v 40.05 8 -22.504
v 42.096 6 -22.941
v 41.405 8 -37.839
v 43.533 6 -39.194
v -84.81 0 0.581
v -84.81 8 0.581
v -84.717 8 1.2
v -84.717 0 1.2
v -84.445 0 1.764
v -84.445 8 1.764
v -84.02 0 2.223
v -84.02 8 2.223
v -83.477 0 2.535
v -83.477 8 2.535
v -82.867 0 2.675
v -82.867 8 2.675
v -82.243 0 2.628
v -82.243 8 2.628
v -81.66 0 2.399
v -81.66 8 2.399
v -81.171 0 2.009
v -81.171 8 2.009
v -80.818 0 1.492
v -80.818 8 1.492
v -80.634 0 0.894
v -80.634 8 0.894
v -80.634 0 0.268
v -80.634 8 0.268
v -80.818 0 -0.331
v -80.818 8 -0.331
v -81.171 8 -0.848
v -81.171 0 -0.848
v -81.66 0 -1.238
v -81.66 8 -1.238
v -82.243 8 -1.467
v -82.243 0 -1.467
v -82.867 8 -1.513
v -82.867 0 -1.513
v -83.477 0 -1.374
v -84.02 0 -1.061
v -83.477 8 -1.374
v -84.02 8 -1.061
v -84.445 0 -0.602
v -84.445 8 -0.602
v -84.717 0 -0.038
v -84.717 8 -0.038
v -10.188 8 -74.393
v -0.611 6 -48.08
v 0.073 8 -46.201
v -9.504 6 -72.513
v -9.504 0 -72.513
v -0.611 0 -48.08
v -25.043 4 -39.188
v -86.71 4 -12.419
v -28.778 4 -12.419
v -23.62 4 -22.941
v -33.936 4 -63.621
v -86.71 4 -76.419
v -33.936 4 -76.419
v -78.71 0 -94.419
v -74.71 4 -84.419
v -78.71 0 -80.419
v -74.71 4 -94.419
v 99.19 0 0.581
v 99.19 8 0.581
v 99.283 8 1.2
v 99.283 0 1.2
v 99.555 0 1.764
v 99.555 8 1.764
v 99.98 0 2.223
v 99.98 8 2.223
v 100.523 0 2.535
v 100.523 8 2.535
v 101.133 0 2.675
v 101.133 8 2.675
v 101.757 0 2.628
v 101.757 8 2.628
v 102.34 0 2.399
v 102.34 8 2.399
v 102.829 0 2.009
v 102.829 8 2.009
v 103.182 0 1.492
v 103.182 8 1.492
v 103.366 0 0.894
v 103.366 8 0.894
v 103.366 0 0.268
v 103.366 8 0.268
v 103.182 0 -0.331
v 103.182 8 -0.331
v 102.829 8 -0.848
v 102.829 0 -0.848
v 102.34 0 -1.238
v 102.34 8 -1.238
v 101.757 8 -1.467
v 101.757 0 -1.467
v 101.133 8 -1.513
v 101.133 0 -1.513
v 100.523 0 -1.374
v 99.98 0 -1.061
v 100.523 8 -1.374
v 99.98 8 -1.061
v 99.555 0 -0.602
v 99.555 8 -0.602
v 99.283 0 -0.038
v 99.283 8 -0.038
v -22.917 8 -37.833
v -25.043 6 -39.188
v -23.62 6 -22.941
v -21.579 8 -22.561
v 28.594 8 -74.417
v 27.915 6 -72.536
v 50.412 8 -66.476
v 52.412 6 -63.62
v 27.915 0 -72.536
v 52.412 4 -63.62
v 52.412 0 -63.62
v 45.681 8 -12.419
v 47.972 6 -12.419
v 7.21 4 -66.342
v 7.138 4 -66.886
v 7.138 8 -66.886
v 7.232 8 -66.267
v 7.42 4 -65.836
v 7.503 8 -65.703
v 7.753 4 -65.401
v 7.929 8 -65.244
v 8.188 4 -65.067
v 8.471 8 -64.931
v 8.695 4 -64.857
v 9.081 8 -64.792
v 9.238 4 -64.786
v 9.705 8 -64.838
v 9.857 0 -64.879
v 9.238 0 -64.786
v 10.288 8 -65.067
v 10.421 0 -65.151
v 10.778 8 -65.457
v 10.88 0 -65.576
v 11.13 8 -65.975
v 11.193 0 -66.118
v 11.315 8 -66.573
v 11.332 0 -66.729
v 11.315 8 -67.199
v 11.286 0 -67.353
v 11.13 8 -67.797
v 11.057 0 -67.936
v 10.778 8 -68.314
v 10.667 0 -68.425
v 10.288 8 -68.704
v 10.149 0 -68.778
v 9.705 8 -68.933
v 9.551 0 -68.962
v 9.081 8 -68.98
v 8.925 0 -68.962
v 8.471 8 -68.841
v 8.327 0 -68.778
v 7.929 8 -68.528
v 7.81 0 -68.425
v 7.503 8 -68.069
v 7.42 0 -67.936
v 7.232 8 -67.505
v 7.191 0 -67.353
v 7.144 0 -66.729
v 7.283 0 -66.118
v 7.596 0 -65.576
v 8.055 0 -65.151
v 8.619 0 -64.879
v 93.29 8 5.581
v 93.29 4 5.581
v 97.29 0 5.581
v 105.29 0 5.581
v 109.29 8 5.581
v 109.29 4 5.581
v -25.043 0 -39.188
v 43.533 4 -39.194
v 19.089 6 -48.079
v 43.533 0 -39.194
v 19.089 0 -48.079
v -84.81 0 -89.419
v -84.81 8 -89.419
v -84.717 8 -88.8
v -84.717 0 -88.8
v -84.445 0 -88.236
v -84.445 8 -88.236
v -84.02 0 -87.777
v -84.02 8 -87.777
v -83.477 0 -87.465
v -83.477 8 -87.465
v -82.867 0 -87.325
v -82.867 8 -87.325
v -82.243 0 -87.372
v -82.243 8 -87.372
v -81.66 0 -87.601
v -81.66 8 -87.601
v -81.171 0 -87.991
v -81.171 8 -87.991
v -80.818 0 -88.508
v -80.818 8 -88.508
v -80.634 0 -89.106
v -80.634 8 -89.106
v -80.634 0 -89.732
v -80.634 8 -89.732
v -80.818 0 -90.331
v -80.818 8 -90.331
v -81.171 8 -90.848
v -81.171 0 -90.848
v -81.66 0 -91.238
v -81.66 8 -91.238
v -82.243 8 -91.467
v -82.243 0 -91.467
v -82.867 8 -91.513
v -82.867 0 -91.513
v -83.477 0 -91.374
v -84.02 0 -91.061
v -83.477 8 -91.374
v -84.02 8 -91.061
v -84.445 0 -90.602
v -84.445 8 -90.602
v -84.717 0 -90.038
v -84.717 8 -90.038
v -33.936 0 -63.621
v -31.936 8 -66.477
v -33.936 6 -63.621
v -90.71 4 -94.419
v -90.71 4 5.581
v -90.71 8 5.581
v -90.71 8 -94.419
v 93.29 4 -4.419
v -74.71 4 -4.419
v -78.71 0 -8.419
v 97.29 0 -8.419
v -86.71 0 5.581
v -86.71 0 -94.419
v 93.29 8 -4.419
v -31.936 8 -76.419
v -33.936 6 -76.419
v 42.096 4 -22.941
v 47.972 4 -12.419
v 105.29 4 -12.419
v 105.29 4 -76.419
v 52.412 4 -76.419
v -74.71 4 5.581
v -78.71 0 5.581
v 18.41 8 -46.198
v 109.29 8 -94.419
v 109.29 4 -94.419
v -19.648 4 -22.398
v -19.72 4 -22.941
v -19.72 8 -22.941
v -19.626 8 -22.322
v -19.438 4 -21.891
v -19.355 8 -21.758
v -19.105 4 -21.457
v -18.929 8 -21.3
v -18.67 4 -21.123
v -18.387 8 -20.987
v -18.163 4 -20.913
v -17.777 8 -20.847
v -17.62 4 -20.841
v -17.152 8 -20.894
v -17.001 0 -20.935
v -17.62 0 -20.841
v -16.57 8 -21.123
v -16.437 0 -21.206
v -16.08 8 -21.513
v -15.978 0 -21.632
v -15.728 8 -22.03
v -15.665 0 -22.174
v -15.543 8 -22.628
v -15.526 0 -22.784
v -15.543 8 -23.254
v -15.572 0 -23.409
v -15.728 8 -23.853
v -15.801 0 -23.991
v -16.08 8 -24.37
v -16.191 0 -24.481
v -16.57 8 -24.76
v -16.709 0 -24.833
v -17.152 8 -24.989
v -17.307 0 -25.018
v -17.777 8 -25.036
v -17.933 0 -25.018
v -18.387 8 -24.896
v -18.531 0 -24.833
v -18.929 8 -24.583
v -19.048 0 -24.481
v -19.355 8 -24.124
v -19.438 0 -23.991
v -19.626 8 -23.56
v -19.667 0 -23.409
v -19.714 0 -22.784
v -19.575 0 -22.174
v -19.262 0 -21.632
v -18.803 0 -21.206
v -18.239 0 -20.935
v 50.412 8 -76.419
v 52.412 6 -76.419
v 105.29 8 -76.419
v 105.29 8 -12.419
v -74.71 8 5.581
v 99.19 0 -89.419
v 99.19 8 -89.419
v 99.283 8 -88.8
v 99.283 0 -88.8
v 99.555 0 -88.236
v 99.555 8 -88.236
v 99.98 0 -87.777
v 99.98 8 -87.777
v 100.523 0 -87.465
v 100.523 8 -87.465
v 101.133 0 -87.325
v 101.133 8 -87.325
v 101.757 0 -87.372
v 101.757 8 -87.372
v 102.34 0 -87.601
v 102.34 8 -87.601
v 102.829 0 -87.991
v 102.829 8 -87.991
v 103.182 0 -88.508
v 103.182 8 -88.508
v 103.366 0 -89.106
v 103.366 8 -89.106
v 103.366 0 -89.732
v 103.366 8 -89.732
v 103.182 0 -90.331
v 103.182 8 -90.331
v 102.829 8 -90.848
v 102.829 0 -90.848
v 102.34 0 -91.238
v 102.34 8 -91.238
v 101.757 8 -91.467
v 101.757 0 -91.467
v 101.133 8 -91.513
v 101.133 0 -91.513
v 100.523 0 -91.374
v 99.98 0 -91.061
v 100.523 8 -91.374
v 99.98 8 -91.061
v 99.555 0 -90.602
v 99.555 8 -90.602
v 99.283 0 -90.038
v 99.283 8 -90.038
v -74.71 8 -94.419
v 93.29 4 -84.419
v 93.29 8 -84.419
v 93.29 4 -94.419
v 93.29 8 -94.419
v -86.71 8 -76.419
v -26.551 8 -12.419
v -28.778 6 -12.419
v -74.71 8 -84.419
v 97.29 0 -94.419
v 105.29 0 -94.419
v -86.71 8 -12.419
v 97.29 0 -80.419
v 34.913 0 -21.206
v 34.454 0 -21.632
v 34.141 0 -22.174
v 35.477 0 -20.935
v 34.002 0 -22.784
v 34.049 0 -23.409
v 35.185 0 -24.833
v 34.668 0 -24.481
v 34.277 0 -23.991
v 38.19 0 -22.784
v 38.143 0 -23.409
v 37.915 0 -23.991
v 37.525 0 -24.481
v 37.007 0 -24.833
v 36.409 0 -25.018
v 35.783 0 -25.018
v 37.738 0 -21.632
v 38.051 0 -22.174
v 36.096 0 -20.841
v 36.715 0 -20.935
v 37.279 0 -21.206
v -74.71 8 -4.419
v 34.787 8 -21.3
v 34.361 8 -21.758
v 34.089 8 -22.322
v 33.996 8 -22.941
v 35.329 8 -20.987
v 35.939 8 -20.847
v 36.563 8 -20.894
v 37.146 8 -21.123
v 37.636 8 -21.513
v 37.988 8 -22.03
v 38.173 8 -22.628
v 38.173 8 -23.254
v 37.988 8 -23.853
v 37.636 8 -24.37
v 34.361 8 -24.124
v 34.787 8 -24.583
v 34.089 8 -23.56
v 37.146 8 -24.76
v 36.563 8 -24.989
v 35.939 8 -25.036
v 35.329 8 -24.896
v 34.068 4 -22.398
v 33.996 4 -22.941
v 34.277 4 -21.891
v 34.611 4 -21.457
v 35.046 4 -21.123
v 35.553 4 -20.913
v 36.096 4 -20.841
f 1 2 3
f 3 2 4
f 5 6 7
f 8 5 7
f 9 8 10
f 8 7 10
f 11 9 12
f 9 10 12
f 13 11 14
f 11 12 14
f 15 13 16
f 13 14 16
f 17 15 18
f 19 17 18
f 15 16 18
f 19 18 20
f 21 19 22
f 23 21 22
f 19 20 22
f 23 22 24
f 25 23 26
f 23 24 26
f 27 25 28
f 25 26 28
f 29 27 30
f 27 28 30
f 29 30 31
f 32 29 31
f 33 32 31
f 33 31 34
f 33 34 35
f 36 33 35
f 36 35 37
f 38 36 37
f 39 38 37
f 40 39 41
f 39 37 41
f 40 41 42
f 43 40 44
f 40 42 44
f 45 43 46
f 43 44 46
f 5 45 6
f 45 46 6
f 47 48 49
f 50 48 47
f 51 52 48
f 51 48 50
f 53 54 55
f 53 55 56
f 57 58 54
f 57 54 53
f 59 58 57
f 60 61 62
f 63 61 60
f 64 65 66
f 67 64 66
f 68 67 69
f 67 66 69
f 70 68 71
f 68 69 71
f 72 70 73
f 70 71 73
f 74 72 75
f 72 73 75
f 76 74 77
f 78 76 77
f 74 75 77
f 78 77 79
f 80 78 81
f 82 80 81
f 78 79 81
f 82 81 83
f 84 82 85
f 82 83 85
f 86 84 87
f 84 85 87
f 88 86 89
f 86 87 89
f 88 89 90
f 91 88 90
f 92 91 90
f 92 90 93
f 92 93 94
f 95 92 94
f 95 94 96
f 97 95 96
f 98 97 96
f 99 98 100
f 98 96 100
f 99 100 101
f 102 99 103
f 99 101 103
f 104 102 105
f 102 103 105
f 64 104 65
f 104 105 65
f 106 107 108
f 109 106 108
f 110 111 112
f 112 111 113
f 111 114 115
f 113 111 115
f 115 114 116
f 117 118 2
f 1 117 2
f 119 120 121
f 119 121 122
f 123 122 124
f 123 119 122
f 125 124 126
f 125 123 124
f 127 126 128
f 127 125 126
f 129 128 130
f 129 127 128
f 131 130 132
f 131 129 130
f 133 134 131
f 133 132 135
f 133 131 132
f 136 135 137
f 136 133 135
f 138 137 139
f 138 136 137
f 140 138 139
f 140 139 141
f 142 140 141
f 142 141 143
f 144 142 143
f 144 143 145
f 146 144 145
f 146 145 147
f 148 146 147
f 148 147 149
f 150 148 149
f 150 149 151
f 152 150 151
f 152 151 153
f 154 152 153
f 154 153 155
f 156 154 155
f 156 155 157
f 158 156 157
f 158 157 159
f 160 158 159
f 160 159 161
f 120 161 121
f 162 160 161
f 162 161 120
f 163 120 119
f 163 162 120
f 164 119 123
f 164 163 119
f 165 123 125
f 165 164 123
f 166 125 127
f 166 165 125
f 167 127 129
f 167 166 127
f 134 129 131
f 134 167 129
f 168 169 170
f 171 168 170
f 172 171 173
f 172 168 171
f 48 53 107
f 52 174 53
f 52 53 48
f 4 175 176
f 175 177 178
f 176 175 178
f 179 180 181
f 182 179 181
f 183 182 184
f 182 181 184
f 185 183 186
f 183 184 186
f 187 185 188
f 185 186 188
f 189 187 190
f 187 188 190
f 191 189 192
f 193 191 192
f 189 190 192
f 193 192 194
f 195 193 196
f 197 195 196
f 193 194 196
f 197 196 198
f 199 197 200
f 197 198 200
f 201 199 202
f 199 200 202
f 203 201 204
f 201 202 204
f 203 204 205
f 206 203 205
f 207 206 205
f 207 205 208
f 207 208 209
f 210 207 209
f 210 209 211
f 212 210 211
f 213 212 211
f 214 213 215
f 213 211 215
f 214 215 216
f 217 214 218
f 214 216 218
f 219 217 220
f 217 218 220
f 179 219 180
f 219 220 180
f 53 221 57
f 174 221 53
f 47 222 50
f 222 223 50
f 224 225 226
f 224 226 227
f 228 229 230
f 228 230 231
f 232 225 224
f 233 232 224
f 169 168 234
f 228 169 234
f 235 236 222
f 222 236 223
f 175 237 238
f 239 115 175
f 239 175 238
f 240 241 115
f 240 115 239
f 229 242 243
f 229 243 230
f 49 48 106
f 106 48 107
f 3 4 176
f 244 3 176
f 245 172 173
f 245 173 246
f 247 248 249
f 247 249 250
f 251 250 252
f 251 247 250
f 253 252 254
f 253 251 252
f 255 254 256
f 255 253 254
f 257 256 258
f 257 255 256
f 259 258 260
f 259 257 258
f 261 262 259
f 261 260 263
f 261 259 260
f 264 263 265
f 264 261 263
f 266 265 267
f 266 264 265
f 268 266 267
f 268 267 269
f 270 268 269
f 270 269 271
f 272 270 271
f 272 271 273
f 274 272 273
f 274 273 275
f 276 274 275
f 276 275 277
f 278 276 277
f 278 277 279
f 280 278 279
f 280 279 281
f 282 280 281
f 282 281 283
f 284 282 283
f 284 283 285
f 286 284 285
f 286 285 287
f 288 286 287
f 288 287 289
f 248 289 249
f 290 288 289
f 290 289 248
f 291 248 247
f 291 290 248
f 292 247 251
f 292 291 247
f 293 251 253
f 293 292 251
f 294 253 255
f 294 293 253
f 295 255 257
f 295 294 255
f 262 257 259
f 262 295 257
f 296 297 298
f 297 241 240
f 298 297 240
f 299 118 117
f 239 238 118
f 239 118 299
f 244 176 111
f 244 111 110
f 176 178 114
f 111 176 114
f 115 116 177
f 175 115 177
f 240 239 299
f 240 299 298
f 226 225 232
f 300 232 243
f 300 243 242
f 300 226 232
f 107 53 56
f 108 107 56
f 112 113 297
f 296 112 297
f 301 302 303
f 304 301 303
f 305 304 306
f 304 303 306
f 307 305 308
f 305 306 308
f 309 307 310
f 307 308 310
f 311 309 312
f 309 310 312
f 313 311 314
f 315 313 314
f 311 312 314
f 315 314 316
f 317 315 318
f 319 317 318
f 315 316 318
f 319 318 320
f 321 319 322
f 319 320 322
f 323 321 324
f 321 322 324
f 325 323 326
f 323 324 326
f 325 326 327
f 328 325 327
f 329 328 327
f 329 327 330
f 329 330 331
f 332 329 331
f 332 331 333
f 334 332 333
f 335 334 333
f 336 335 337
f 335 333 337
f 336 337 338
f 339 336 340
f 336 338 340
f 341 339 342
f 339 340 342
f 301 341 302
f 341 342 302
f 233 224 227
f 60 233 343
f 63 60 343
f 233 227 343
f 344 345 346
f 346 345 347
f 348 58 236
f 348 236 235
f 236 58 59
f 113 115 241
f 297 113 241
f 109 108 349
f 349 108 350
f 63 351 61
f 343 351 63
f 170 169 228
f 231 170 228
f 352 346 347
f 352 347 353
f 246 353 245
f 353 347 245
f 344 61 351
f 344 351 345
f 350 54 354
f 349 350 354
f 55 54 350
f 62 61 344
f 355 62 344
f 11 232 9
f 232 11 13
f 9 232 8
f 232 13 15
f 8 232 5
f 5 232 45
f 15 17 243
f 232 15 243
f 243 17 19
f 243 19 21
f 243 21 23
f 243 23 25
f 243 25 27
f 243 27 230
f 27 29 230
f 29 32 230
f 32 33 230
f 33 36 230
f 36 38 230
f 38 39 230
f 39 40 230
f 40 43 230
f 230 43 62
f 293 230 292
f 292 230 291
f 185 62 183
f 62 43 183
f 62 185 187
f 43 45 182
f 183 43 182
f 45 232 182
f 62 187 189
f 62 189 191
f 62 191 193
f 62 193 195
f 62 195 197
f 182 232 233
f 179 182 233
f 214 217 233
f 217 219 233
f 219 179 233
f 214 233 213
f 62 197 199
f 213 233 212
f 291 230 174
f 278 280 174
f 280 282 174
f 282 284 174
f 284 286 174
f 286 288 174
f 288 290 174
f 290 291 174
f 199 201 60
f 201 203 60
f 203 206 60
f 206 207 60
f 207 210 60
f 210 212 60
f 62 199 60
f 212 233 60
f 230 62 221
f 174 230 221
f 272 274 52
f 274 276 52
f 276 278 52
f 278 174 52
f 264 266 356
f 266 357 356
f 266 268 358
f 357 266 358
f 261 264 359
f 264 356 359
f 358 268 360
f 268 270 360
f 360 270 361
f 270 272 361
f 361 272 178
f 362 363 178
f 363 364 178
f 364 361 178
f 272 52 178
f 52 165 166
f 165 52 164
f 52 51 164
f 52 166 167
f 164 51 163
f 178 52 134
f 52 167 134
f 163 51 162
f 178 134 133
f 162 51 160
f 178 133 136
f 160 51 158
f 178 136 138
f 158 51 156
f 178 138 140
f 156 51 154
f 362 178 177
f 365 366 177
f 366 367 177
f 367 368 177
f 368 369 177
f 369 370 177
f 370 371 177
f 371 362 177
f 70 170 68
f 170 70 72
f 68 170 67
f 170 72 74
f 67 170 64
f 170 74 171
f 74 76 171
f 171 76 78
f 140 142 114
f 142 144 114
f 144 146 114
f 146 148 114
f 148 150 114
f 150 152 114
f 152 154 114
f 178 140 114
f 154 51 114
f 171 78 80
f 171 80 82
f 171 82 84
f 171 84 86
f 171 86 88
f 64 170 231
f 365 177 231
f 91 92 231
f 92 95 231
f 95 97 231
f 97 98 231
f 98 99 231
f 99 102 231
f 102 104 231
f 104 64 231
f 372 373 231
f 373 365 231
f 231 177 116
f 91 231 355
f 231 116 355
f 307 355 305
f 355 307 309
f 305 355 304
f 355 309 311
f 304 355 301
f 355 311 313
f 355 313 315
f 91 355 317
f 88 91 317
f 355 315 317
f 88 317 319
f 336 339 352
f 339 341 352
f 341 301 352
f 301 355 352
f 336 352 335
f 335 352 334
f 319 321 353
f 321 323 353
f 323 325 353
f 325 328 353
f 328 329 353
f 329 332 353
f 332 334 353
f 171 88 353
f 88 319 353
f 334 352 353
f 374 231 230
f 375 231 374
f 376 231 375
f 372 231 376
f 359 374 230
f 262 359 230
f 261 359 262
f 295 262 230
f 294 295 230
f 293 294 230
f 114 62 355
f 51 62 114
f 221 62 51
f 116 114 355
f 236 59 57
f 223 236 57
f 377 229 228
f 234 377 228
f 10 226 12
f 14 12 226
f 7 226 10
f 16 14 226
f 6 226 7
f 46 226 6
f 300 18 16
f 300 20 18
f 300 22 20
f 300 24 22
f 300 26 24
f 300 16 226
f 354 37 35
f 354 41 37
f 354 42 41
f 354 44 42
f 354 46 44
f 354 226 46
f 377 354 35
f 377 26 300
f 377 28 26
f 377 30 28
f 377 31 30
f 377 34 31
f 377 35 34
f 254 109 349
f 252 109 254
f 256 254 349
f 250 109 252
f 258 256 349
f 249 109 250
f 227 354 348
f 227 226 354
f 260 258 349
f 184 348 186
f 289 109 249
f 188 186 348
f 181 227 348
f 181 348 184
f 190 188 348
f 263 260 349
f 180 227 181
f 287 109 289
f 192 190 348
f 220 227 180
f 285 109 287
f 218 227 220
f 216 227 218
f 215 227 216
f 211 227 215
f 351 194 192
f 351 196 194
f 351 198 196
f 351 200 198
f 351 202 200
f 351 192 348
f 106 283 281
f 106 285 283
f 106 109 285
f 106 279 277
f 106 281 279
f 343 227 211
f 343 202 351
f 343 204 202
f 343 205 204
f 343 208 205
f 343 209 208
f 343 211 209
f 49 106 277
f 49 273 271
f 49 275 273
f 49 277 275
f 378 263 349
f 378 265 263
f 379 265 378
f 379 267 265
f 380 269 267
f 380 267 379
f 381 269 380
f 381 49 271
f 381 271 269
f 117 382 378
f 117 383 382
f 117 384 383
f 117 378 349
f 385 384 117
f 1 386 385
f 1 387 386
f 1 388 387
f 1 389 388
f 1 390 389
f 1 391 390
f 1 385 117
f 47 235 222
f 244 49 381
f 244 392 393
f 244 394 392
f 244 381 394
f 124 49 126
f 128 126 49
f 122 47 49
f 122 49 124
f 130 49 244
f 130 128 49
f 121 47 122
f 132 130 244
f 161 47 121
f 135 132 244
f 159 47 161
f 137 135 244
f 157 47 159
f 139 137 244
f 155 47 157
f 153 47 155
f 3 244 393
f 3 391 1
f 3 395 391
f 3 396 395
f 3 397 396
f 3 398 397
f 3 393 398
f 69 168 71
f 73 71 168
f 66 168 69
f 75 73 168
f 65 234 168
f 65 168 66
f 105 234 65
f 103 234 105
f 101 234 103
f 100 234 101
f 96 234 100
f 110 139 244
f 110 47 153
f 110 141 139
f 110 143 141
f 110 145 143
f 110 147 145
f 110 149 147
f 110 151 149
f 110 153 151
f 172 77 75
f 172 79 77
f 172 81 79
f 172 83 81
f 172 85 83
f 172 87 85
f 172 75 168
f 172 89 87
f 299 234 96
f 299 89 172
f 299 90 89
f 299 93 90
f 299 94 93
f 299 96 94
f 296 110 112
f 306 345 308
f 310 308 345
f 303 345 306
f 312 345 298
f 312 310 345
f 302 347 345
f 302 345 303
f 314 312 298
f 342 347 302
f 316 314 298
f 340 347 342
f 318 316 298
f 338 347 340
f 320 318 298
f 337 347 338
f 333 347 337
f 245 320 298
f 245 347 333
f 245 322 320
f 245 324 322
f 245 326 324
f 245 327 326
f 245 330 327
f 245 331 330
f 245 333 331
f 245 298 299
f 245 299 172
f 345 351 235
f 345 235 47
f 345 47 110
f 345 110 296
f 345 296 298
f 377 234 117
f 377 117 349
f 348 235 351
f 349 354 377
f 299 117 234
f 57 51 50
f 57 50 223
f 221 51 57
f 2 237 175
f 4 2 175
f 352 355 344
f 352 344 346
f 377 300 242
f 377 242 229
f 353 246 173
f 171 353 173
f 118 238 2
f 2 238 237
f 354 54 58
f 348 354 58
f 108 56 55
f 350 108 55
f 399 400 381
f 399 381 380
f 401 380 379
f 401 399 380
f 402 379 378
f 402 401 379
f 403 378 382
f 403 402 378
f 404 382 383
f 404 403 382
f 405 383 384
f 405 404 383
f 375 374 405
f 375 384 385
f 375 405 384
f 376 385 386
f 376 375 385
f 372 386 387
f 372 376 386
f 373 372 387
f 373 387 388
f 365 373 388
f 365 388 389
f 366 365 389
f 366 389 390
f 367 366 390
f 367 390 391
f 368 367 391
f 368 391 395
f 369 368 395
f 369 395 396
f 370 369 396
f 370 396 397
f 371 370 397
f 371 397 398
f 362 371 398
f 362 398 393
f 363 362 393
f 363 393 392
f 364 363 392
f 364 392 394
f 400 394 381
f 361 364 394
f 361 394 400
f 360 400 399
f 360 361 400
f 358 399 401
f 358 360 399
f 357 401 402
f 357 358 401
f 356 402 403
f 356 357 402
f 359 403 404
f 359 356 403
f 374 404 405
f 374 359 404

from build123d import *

# Parameters (mm, degrees)
SKETCH_1_W      = 200
SKETCH_1_H      = 80
SKETCH_1_R      = 2.1
EXTRUDE_1_DEPTH = 4
SKETCH_2_W      = 200
SKETCH_2_H      = 80
SKETCH_2_W_2    = 192
SKETCH_2_H_2    = 64
SKETCH_2_R      = 6
SKETCH_2_R_2    = 2.1
EXTRUDE_4_DEPTH = 4
SKETCH_4_W      = 16
SKETCH_4_H      = 10
SKETCH_4_R      = 2.1
EXTRUDE_5_DEPTH = 8
CHAMFER_2_SIZE  = 4
CHAMFER_3_SIZE  = 2


with BuildPart() as part:
    # Эскиз1 → Бобышка-Вытянуть1 (new body)
    with BuildSketch(Plane(origin=(0, 0, 0), x_dir=(1, 0, 0), z_dir=(0, 1, 0))):
        with Locations((9.289774647, 44.419345598)):
            Rectangle(SKETCH_1_W, SKETCH_1_H)
        with Locations(Location((9.238204765, 66.885667768, 0), (0, 0, 270))):
            Circle(SKETCH_1_R, mode=Mode.SUBTRACT)
        with Locations(Location((36.096151087, 22.941432753, 0), (0, 0, 270))):
            Circle(SKETCH_1_R, mode=Mode.SUBTRACT)
        with Locations(Location((-17.619741555, 22.941432753, 0), (0, 0, 270))):
            Circle(SKETCH_1_R, mode=Mode.SUBTRACT)
        Polygon((19.089140112, 48.079252727), (27.915271652, 72.535858158), (52.411725454, 63.619878129), (43.532640104, 39.193825212), align=None, mode=Mode.SUBTRACT)
        Polygon((-33.936103706, 63.620851303), (-25.043175056, 39.187730639), (-0.611166915, 48.080254364), (-9.504095565, 72.513375028), align=None, mode=Mode.SUBTRACT)
    extrude(amount=EXTRUDE_1_DEPTH)

    # Эскиз2 → Бобышка-Вытянуть4 (add)
    # profile 1 of 5: a face of its own
    with BuildSketch(Plane(origin=(0, 4, 0), x_dir=(1, 0, 0), z_dir=(0, 1, 0))):
        with Locations((9.289774647, 44.419345598)):
            Rectangle(SKETCH_2_W, SKETCH_2_H)
        with Locations((9.289774647, 44.419345598)):
            Rectangle(SKETCH_2_W_2, SKETCH_2_H_2, mode=Mode.SUBTRACT)
    # profile 2 of 5: a face of its own
    with BuildSketch(Plane(origin=(0, 4, 0), x_dir=(1, 0, 0), z_dir=(0, 1, 0))):
        with Locations((-17.619741555, 22.941432753)):
            Circle(SKETCH_2_R)
        with Locations(Location((-17.619741555, 22.941432753, 0), (0, 0, 180))):
            Circle(SKETCH_2_R_2, mode=Mode.SUBTRACT)
    # profile 3 of 5: a face of its own
    with BuildSketch(Plane(origin=(0, 4, 0), x_dir=(1, 0, 0), z_dir=(0, 1, 0))):
        with Locations((36.096151087, 22.941432753)):
            Circle(SKETCH_2_R)
        with Locations(Location((36.096151087, 22.941432753, 0), (0, 0, 180))):
            Circle(SKETCH_2_R_2, mode=Mode.SUBTRACT)
    # profile 4 of 5: a face of its own
    with BuildSketch(Plane(origin=(0, 4, 0), x_dir=(1, 0, 0), z_dir=(0, 1, 0))):
        with BuildLine():
            Line((-23.619741555, 22.941432753), (-28.77792263, 12.419345598))
            Line((-28.77792263, 12.419345598), (47.972182779, 12.419345598))
            Line((47.972182779, 12.419345598), (42.096151087, 22.941432753))
            ThreePointArc((42.096151087, 22.941432753), (36.096151087, 16.941432753), (30.096151087, 22.941432753))
            Line((30.096151087, 22.941432753), (-11.619741555, 22.941432753))
            ThreePointArc((-11.619741555, 22.941432753), (-17.619741555, 16.941432753), (-23.619741555, 22.941432753))
        make_face()
    # profile 5 of 5: a face of its own
    with BuildSketch(Plane(origin=(0, 4, 0), x_dir=(1, 0, 0), z_dir=(0, 1, 0))):
        with BuildLine():
            Line((-25.043175056, 39.187730639), (-23.619741555, 22.941432753))
            ThreePointArc((-23.619741555, 22.941432753), (-17.619741555, 28.941432753), (-11.619741555, 22.941432753))
            Line((-11.619741555, 22.941432753), (30.096151087, 22.941432753))
            ThreePointArc((30.096151087, 22.941432753), (36.096151087, 28.941432753), (42.096151087, 22.941432753))
            Line((42.096151087, 22.941432753), (43.532640104, 39.193825212))
            Line((43.532640104, 39.193825212), (19.089140112, 48.079252727))
            Line((19.089140112, 48.079252727), (27.915271652, 72.535858158))
            Line((27.915271652, 72.535858158), (52.411725454, 63.619878129))
            Line((52.411725454, 63.619878129), (52.411725454, 76.419345598))
            Line((52.411725454, 76.419345598), (-33.936103706, 76.419345598))
            Line((-33.936103706, 76.419345598), (-33.936103706, 63.620851303))
            Line((-33.936103706, 63.620851303), (-9.504095565, 72.513375028))
            Line((-9.504095565, 72.513375028), (-0.611166915, 48.080254364))
            Line((-0.611166915, 48.080254364), (-25.043175056, 39.187730639))
        make_face()
        with Locations(Location((9.238204765, 66.885667768, 0), (0, 0, 180))):
            Circle(SKETCH_2_R_2, mode=Mode.SUBTRACT)
    extrude(amount=EXTRUDE_4_DEPTH)

    # Эскиз4 → Бобышка-Вытянуть5 (add)
    # profile 1 of 4: a face of its own
    with BuildSketch(Plane(origin=(0, 8, 0), x_dir=(1, 0, 0), z_dir=(0, 1, 0))):
        with Locations((101.289774647, 89.419345598)):
            Rectangle(SKETCH_4_W, SKETCH_4_H)
        with Locations(Location((101.289774647, 89.419345598, 0), (0, 0, 180))):
            Circle(SKETCH_4_R, mode=Mode.SUBTRACT)
    # profile 2 of 4: a face of its own
    with BuildSketch(Plane(origin=(0, 8, 0), x_dir=(1, 0, 0), z_dir=(0, 1, 0))):
        with Locations((-82.710225353, 89.419345598)):
            Rectangle(SKETCH_4_W, SKETCH_4_H)
        with Locations(Location((-82.710225353, 89.419345598, 0), (0, 0, 180))):
            Circle(SKETCH_4_R, mode=Mode.SUBTRACT)
    # profile 3 of 4: a face of its own
    with BuildSketch(Plane(origin=(0, 8, 0), x_dir=(1, 0, 0), z_dir=(0, 1, 0))):
        with Locations((101.289774647, -0.580654402)):
            Rectangle(SKETCH_4_W, SKETCH_4_H)
        with Locations(Location((101.289774647, -0.580654402, 0), (0, 0, 180))):
            Circle(SKETCH_4_R, mode=Mode.SUBTRACT)
    # profile 4 of 4: a face of its own
    with BuildSketch(Plane(origin=(0, 8, 0), x_dir=(1, 0, 0), z_dir=(0, 1, 0))):
        with Locations((-82.710225353, -0.580654402)):
            Rectangle(SKETCH_4_W, SKETCH_4_H)
        with Locations(Location((-82.710225353, -0.580654402, 0), (0, 0, 180))):
            Circle(SKETCH_4_R, mode=Mode.SUBTRACT)
    extrude(amount=-EXTRUDE_5_DEPTH)

    # Фаска2
    chamfer_2_edges = [part.edges().sort_by_distance(p)[0] for p in [
        (9.289774647, 0, -84.419345598),
        (93.289774647, 0, -89.419345598),
        (93.289774647, 0, 0.580654402),
        (-74.710225353, 0, -89.419345598),
        (9.289774647, 0, -4.419345598),
        (-74.710225353, 0, 0.580654402),
        (-90.710225353, 0, -44.419345598),
        (109.289774647, 0, -44.419345598),
    ]]
    chamfer(chamfer_2_edges, length=CHAMFER_2_SIZE)

    # Фаска3
    chamfer_3_edges = [part.edges().sort_by_distance(p)[0] for p in [
        (-33.936103706, 8, -70.020098451),
        (-12.827170986, 8, -43.633992502),
        (45.034166933, 8, -17.680389175),
        (-24.331458306, 8, -31.064581696),
        (42.814395596, 8, -31.067628982),
        (31.310890108, 8, -43.63653897),
        (40.163498553, 8, -68.077868143),
        (52.411725454, 8, -70.019611864),
        (-26.198832093, 8, -17.680389175),
        (-21.720099636, 8, -68.067113165),
    ]]
    chamfer(chamfer_3_edges, length=CHAMFER_3_SIZE)


solid = part.part
